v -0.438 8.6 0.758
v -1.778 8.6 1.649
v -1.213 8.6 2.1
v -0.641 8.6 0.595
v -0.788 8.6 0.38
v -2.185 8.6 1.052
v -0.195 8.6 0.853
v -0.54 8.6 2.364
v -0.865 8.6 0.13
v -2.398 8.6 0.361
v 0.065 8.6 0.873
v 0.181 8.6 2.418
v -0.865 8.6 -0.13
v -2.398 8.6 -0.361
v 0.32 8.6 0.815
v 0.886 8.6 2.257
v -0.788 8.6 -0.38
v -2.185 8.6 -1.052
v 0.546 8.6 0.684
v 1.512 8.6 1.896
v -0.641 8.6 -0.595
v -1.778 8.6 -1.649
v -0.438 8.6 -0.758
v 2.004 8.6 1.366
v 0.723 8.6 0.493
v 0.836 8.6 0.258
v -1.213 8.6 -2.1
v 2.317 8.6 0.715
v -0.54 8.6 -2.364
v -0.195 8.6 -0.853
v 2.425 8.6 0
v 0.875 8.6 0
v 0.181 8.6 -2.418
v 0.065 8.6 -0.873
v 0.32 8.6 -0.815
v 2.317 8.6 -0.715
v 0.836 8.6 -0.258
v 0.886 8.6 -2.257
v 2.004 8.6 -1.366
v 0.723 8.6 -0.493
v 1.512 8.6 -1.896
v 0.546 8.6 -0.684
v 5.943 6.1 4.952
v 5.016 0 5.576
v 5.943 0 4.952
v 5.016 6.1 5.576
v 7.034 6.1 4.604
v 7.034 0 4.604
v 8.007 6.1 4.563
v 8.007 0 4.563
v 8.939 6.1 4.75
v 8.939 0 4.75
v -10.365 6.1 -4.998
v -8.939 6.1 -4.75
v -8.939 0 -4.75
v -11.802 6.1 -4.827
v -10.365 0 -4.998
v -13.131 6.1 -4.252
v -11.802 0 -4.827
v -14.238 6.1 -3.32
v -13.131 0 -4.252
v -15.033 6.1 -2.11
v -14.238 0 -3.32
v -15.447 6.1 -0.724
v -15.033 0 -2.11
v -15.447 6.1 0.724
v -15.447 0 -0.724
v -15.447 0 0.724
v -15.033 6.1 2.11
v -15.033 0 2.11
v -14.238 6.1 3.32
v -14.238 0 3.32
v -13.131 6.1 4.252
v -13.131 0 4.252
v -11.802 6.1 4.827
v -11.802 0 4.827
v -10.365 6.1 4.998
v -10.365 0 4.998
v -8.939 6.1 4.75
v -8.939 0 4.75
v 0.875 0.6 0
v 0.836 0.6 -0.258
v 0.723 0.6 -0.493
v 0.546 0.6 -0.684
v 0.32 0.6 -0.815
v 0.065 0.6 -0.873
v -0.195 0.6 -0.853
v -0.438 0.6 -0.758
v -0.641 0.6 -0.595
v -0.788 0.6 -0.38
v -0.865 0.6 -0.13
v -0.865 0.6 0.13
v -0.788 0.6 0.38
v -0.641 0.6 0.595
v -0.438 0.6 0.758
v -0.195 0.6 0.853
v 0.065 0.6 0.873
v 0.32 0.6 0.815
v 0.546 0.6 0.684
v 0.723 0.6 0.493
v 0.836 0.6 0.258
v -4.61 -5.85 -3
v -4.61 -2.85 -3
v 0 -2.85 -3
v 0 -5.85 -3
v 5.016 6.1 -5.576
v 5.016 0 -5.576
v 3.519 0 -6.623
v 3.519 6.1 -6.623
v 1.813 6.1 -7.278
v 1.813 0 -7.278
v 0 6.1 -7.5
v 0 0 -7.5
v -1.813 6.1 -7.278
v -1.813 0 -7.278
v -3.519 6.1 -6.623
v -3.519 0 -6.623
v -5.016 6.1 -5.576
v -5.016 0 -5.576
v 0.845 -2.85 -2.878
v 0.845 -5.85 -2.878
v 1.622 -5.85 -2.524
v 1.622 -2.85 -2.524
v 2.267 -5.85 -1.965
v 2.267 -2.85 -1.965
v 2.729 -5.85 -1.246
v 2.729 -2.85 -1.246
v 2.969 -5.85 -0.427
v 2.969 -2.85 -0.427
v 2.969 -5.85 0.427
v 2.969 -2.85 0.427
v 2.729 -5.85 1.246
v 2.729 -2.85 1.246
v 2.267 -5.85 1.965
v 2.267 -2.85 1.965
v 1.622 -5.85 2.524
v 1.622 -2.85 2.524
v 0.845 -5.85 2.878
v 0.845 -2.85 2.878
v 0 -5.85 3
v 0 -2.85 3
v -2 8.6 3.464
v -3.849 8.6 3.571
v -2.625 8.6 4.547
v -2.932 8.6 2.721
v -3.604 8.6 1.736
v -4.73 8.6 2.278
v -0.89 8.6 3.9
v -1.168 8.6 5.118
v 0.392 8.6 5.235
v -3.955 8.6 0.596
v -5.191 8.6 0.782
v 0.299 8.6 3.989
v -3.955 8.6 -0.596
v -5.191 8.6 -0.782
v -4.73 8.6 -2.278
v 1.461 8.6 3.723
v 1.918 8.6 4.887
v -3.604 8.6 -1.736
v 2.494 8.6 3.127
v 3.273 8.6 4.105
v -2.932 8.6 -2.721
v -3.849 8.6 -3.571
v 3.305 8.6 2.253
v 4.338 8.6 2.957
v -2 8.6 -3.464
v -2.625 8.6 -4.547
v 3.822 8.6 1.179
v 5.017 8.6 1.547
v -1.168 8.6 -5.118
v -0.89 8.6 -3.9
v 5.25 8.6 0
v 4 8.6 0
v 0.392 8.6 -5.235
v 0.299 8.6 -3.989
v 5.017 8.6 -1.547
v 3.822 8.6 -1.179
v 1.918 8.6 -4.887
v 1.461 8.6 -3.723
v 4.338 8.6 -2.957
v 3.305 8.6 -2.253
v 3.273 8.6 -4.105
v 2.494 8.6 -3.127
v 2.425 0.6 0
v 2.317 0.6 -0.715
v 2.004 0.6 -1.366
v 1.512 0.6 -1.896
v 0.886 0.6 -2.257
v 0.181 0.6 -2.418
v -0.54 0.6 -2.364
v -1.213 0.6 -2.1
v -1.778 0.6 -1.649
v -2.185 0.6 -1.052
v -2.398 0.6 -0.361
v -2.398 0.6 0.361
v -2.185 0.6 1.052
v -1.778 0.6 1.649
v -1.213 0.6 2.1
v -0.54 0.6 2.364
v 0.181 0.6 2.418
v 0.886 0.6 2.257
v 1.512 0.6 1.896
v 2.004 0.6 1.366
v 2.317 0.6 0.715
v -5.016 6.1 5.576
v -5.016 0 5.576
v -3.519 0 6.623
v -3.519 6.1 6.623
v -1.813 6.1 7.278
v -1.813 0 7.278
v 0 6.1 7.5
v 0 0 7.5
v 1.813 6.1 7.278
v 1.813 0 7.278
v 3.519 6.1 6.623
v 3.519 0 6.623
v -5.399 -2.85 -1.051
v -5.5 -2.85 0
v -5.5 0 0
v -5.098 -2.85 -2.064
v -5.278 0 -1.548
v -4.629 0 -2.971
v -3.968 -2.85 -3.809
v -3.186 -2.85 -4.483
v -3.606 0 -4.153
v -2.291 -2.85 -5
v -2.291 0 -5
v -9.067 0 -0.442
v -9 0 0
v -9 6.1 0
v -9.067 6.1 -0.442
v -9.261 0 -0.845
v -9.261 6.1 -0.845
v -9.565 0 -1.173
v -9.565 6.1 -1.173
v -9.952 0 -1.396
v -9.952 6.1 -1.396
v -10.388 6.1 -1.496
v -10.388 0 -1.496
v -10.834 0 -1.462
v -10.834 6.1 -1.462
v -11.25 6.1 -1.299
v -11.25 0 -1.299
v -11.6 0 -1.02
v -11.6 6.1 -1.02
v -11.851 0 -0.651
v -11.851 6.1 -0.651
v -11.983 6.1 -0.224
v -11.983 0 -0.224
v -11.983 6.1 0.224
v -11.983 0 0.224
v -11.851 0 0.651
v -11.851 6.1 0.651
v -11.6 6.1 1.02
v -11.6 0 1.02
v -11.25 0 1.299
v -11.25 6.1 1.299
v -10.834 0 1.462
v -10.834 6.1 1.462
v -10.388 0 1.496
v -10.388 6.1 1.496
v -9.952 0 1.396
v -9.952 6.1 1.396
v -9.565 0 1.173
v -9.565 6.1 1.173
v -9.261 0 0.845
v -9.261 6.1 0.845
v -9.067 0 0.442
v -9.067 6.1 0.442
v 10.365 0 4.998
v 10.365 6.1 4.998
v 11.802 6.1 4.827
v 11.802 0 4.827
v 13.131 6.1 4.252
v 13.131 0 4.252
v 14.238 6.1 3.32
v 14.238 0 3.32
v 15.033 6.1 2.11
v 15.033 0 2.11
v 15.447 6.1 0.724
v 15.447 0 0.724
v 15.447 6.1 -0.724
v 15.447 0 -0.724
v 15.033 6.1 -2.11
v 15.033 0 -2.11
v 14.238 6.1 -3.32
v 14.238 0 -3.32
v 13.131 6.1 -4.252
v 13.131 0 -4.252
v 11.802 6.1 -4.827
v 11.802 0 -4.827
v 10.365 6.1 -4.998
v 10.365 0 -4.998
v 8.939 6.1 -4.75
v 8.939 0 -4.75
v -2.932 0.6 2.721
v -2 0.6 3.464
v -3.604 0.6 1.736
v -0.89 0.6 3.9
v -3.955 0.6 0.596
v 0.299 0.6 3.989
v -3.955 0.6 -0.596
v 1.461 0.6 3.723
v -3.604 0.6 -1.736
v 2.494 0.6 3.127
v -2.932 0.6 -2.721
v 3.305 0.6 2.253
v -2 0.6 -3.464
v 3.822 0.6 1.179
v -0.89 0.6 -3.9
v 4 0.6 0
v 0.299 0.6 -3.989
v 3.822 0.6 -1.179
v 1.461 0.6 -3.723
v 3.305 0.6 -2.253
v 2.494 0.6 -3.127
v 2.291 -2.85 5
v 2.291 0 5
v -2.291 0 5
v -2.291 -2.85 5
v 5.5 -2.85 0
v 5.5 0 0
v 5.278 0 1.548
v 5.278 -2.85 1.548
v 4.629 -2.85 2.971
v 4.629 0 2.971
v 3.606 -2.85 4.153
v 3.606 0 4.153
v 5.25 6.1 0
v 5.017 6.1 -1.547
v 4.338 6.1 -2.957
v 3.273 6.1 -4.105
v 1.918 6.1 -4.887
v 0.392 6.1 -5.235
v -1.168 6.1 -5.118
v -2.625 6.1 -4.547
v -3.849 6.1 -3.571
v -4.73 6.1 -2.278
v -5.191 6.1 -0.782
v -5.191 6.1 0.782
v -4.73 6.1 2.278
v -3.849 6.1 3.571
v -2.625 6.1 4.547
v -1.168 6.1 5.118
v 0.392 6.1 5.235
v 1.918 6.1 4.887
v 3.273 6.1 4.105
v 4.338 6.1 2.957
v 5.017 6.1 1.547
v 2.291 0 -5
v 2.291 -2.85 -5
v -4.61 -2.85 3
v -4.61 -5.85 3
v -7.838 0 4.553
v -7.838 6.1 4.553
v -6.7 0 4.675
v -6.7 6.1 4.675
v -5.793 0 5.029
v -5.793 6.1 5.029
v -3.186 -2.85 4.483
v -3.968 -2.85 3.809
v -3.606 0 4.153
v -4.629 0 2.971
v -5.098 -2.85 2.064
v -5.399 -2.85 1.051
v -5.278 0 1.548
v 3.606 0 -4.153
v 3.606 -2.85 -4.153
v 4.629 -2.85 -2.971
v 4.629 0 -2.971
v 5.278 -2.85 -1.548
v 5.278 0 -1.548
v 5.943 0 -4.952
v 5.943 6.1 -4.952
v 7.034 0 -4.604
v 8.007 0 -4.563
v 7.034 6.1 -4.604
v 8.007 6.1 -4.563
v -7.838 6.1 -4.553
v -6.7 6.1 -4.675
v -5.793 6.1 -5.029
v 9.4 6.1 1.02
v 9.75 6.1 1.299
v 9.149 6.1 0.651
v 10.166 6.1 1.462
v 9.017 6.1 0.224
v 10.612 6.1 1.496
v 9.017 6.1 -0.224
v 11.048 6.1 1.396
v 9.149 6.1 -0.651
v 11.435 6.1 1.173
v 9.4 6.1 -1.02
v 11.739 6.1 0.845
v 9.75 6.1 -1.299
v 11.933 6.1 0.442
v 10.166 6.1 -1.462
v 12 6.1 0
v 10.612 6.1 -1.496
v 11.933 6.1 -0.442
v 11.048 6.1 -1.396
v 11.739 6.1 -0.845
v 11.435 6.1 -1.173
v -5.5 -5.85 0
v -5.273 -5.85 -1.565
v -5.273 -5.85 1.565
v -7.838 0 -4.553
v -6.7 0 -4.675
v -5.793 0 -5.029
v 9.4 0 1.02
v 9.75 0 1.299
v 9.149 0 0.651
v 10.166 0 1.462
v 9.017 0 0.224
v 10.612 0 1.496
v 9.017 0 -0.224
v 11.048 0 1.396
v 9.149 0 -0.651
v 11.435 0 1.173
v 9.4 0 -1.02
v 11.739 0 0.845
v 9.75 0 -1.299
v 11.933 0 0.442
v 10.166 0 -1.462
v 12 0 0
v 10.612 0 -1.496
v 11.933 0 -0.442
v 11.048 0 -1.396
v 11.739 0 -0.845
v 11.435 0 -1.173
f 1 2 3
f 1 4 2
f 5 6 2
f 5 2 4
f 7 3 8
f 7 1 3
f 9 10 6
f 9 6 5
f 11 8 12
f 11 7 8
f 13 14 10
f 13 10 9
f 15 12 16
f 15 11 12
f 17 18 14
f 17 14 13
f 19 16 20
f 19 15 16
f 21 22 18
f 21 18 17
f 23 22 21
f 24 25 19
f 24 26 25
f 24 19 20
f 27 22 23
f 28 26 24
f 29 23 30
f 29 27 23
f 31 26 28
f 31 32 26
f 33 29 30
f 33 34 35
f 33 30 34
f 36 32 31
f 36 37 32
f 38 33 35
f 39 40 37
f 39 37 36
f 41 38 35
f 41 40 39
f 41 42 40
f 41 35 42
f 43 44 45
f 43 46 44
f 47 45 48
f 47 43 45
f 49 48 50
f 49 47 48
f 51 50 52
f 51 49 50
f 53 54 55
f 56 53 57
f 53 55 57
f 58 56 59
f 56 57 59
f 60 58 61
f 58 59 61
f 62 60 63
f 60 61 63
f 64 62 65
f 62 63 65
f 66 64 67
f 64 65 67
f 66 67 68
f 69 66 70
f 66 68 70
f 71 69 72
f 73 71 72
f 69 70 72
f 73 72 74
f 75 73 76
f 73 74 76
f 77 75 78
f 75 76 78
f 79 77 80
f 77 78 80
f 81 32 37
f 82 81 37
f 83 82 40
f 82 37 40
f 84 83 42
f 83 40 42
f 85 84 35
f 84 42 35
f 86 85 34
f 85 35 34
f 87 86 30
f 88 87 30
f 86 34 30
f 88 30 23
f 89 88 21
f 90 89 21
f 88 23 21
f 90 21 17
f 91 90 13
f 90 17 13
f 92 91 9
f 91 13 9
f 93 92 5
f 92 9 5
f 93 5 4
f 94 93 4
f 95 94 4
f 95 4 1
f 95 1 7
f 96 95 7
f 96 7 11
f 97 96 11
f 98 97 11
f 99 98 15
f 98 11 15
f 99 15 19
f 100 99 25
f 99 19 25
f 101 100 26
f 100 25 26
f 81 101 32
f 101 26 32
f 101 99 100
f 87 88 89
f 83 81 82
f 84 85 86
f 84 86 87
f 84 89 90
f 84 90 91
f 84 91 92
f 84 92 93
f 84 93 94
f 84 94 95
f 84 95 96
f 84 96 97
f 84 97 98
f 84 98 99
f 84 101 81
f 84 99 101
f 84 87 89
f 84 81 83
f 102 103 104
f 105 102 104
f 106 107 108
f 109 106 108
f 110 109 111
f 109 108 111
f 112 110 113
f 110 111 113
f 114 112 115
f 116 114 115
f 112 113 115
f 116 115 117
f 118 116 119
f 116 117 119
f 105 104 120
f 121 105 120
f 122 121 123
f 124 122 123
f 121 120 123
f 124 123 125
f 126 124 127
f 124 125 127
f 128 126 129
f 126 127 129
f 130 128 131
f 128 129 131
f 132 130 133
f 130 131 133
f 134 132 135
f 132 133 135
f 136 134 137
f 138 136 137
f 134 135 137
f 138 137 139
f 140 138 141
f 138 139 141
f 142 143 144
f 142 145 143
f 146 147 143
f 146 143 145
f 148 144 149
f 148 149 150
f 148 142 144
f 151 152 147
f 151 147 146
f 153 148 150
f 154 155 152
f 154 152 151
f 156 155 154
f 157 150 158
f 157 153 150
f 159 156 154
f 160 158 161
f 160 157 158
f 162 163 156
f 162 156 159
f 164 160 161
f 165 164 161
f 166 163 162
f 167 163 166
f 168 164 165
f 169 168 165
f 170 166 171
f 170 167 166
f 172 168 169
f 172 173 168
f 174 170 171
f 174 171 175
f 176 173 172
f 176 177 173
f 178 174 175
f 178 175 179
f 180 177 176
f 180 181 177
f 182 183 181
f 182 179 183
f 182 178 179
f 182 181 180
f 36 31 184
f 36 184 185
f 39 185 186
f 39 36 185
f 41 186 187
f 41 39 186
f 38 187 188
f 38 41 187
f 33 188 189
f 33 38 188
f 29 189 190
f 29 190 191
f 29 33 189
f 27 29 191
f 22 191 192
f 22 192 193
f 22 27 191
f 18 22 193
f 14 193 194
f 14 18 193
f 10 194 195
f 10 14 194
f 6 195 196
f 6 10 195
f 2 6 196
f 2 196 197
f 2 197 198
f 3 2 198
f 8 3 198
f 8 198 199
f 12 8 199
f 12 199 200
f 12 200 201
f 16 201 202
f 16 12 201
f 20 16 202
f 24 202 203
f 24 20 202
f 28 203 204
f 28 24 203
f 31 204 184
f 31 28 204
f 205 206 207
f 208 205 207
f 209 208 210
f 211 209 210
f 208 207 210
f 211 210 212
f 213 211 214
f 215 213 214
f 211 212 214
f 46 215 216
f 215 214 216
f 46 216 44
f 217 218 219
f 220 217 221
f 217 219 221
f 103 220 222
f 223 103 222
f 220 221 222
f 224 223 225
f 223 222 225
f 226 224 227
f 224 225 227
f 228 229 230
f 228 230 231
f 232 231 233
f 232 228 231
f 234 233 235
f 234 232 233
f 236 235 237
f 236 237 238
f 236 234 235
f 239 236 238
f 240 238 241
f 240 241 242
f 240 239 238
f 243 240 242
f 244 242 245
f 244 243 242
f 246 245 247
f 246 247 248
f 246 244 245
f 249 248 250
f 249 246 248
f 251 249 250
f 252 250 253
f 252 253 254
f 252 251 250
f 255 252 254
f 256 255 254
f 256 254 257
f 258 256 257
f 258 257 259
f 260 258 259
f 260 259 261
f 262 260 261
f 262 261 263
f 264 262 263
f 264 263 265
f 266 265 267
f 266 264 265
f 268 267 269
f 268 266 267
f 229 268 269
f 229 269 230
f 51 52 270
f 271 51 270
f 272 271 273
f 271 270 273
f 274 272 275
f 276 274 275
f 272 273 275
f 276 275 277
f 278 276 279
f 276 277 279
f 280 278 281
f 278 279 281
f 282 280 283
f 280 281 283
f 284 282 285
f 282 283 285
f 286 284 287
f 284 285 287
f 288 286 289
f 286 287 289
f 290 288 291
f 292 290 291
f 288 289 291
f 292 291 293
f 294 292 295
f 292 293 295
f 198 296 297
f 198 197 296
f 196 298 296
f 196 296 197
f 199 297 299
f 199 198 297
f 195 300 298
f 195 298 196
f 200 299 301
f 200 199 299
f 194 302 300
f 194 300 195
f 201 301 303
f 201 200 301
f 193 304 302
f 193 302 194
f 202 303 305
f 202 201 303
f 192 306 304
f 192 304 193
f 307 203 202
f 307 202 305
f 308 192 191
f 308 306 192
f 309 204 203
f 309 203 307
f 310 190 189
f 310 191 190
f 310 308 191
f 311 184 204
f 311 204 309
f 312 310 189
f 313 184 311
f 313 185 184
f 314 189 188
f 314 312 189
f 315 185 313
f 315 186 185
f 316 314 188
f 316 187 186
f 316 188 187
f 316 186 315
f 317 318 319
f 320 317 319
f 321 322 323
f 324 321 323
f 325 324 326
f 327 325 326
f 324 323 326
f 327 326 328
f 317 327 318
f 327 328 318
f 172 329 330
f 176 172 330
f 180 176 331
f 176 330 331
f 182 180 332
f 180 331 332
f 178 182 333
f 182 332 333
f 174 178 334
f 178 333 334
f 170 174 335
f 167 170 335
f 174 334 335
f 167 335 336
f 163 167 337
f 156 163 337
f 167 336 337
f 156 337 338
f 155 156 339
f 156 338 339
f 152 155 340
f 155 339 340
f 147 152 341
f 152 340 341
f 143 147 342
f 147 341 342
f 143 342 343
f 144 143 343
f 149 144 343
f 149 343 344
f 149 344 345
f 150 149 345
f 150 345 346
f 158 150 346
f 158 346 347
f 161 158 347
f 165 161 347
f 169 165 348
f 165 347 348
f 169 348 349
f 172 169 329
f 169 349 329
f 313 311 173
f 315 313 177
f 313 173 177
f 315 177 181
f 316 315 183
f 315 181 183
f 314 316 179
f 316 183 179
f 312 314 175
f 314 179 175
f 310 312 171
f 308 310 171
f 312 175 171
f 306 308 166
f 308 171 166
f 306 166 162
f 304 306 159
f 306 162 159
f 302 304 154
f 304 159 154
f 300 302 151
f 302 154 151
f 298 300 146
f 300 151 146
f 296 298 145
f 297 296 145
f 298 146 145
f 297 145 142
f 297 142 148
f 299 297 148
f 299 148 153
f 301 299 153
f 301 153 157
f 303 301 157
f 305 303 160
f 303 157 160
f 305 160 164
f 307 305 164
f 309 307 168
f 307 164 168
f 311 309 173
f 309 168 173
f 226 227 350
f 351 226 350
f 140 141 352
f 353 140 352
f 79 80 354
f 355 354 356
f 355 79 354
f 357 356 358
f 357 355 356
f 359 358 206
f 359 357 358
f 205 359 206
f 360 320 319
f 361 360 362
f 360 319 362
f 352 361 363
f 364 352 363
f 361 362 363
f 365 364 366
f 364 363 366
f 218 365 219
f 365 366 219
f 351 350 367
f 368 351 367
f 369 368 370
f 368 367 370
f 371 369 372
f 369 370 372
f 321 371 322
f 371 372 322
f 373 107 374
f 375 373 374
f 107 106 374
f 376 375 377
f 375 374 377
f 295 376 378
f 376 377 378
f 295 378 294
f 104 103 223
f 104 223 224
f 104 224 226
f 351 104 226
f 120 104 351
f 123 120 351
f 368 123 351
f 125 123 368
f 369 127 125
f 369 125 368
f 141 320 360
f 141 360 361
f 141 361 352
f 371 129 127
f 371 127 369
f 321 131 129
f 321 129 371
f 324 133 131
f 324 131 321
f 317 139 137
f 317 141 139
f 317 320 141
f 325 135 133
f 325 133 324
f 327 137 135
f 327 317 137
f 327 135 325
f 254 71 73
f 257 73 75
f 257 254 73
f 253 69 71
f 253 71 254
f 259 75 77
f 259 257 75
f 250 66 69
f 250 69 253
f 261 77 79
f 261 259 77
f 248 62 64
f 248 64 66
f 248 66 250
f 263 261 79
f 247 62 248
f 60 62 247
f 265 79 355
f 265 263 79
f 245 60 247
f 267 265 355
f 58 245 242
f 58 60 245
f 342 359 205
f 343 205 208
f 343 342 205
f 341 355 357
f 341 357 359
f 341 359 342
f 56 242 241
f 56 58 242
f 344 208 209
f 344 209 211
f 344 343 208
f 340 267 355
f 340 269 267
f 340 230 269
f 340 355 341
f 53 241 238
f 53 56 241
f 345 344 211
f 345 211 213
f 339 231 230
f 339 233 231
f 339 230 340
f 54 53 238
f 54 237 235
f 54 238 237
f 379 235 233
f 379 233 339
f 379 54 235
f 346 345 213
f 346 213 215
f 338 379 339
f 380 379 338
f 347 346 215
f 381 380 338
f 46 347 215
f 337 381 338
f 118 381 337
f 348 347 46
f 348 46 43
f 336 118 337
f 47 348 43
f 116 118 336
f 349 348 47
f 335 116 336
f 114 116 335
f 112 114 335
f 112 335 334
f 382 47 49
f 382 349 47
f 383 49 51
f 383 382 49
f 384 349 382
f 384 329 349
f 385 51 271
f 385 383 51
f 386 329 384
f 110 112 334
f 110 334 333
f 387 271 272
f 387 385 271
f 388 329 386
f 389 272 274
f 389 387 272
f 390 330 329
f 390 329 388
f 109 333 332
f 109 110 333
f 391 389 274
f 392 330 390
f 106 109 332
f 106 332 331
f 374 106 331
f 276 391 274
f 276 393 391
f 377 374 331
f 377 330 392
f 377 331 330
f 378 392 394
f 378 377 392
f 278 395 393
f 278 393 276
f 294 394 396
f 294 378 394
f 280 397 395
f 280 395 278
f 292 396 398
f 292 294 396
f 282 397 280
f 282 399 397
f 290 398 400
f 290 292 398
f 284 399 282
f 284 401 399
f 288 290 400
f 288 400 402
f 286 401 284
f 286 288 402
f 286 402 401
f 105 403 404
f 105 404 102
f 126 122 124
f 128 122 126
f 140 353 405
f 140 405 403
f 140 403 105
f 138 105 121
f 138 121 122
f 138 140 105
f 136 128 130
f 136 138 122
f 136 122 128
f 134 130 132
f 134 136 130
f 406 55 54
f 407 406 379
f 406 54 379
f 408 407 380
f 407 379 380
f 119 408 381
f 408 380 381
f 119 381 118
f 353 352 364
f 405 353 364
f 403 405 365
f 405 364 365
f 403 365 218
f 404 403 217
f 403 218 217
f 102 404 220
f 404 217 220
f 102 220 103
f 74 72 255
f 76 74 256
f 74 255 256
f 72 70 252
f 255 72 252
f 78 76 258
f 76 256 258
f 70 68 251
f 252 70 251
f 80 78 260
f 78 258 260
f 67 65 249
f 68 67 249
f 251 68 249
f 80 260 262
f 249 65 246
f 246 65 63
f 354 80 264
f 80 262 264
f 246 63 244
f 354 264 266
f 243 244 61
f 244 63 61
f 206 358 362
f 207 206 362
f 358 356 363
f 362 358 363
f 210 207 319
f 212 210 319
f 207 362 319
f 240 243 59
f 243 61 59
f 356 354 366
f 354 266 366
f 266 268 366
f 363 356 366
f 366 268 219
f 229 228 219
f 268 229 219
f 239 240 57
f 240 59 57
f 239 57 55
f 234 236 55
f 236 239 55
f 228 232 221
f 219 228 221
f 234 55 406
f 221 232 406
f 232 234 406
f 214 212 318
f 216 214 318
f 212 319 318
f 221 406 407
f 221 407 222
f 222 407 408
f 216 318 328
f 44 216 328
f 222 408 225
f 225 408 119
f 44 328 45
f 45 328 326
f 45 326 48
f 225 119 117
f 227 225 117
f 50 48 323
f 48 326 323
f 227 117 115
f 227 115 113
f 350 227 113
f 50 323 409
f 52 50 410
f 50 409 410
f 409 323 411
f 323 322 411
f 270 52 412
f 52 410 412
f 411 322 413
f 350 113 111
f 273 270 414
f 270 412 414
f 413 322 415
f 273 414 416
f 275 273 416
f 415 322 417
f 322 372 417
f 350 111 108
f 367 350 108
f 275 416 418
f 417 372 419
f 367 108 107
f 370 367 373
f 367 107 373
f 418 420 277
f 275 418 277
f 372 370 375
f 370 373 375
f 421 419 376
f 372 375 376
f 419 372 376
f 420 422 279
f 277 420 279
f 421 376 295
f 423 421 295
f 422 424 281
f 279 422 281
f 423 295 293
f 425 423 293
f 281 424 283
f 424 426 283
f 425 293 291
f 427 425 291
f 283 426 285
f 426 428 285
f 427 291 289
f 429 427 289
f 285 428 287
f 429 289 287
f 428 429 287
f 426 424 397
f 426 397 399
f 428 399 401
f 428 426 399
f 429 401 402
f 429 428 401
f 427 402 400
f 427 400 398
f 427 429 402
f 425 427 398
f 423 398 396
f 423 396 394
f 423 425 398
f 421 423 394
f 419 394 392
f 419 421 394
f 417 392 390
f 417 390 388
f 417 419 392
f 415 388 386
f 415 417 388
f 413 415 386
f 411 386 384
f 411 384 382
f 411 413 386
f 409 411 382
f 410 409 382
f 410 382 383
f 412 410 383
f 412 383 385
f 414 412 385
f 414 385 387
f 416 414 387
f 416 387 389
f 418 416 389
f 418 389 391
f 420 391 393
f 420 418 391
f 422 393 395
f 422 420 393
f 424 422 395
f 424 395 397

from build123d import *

# Parameters (mm, degrees)
SKETCH1_R           = 7.5
SKETCH1_R_2         = 5
SKETCH1_R_3         = 1.5
BOSS_EXTRUDE1_DEPTH = 6.1
SKETCH2_R           = 5.25
BOSS_EXTRUDE2_DEPTH = 2.5
BOSS_EXTRUDE3_DEPTH = 2.85
SKETCH3_R           = 4
SKETCH3_R_2         = 2.425
SKETCH3_R_3         = 0.875
CUT_EXTRUDE1_DEPTH  = 8
FILLET1_R           = 4
SKETCH5_R           = 3
BOSS_EXTRUDE4_DEPTH = 3


with BuildPart() as part:
    # Sketch1 → Boss-Extrude1 (new body)
    with BuildSketch(Plane(origin=(0, 0, 0), x_dir=(1, 0, 0), z_dir=(0, 1, 0))):
        Circle(SKETCH1_R)
        with Locations((-10.5, 0)):
            Circle(SKETCH1_R_2)
        with Locations((-10.5, 0)):
            Circle(SKETCH1_R_3, mode=Mode.SUBTRACT)
        with Locations((10.5, 0)):
            Circle(SKETCH1_R_2)
        with Locations((10.5, 0)):
            Circle(SKETCH1_R_3, mode=Mode.SUBTRACT)
    extrude(amount=BOSS_EXTRUDE1_DEPTH)

    # Sketch2 → Boss-Extrude2 (add)
    with BuildSketch(Plane(origin=(0, 6.1, 0), x_dir=(1, 0, 0), z_dir=(0, 1, 0))):
        Circle(SKETCH2_R)
    extrude(amount=BOSS_EXTRUDE2_DEPTH)

    # Sketch4 → Boss-Extrude3 (add)
    with BuildSketch(Plane.XZ):
        with BuildLine():
            Line((-2.291287847, -5), (2.291287847, -5))
            ThreePointArc((2.291287847, -5), (4.628827236, -2.970514841), (5.5, 0))
            ThreePointArc((5.5, 0), (4.628827236, 2.970514841), (2.291287847, 5))
            Line((2.291287847, 5), (-2.291287847, 5))
            ThreePointArc((-2.291287847, 5), (-4.628827236, 2.970514841), (-5.5, 0))
            ThreePointArc((-5.5, 0), (-4.628827236, -2.970514841), (-2.291287847, -5))
        make_face()
    extrude(amount=BOSS_EXTRUDE3_DEPTH)

    # Sketch3 → Cut-Extrude1 (cut)
    with BuildSketch(Plane(origin=(0, 8.6, 0), x_dir=(1, 0, 0), z_dir=(0, 1, 0))):
        Circle(SKETCH3_R)
        Circle(SKETCH3_R_2, mode=Mode.SUBTRACT)
        Circle(SKETCH3_R_3)
    extrude(amount=-CUT_EXTRUDE1_DEPTH, mode=Mode.SUBTRACT)

    # Fillet1
    fillet1_edges = [part.edges().sort_by_distance(p)[0] for p in [
        (-6.738095238, 3.05, -3.293641232),
        (6.738095238, 3.05, -3.293641232),
        (6.738095238, 3.05, 3.293641232),
        (-6.738095238, 3.05, 3.293641232),
    ]]
    fillet(fillet1_edges, radius=FILLET1_R)

    # Sketch5 → Boss-Extrude4 (add)
    with BuildSketch(Plane.XZ.offset(2.85)):
        Circle(SKETCH5_R)
        with BuildLine():
            ThreePointArc((0, -3), (-3, 0), (0, 3))
            Line((0, 3), (-4.609772229, 3))
            ThreePointArc((-4.609772229, 3), (-5.5, 0), (-4.609772229, -3))
            Line((-4.609772229, -3), (0, -3))
        make_face()
    extrude(amount=BOSS_EXTRUDE4_DEPTH)


solid = part.part
